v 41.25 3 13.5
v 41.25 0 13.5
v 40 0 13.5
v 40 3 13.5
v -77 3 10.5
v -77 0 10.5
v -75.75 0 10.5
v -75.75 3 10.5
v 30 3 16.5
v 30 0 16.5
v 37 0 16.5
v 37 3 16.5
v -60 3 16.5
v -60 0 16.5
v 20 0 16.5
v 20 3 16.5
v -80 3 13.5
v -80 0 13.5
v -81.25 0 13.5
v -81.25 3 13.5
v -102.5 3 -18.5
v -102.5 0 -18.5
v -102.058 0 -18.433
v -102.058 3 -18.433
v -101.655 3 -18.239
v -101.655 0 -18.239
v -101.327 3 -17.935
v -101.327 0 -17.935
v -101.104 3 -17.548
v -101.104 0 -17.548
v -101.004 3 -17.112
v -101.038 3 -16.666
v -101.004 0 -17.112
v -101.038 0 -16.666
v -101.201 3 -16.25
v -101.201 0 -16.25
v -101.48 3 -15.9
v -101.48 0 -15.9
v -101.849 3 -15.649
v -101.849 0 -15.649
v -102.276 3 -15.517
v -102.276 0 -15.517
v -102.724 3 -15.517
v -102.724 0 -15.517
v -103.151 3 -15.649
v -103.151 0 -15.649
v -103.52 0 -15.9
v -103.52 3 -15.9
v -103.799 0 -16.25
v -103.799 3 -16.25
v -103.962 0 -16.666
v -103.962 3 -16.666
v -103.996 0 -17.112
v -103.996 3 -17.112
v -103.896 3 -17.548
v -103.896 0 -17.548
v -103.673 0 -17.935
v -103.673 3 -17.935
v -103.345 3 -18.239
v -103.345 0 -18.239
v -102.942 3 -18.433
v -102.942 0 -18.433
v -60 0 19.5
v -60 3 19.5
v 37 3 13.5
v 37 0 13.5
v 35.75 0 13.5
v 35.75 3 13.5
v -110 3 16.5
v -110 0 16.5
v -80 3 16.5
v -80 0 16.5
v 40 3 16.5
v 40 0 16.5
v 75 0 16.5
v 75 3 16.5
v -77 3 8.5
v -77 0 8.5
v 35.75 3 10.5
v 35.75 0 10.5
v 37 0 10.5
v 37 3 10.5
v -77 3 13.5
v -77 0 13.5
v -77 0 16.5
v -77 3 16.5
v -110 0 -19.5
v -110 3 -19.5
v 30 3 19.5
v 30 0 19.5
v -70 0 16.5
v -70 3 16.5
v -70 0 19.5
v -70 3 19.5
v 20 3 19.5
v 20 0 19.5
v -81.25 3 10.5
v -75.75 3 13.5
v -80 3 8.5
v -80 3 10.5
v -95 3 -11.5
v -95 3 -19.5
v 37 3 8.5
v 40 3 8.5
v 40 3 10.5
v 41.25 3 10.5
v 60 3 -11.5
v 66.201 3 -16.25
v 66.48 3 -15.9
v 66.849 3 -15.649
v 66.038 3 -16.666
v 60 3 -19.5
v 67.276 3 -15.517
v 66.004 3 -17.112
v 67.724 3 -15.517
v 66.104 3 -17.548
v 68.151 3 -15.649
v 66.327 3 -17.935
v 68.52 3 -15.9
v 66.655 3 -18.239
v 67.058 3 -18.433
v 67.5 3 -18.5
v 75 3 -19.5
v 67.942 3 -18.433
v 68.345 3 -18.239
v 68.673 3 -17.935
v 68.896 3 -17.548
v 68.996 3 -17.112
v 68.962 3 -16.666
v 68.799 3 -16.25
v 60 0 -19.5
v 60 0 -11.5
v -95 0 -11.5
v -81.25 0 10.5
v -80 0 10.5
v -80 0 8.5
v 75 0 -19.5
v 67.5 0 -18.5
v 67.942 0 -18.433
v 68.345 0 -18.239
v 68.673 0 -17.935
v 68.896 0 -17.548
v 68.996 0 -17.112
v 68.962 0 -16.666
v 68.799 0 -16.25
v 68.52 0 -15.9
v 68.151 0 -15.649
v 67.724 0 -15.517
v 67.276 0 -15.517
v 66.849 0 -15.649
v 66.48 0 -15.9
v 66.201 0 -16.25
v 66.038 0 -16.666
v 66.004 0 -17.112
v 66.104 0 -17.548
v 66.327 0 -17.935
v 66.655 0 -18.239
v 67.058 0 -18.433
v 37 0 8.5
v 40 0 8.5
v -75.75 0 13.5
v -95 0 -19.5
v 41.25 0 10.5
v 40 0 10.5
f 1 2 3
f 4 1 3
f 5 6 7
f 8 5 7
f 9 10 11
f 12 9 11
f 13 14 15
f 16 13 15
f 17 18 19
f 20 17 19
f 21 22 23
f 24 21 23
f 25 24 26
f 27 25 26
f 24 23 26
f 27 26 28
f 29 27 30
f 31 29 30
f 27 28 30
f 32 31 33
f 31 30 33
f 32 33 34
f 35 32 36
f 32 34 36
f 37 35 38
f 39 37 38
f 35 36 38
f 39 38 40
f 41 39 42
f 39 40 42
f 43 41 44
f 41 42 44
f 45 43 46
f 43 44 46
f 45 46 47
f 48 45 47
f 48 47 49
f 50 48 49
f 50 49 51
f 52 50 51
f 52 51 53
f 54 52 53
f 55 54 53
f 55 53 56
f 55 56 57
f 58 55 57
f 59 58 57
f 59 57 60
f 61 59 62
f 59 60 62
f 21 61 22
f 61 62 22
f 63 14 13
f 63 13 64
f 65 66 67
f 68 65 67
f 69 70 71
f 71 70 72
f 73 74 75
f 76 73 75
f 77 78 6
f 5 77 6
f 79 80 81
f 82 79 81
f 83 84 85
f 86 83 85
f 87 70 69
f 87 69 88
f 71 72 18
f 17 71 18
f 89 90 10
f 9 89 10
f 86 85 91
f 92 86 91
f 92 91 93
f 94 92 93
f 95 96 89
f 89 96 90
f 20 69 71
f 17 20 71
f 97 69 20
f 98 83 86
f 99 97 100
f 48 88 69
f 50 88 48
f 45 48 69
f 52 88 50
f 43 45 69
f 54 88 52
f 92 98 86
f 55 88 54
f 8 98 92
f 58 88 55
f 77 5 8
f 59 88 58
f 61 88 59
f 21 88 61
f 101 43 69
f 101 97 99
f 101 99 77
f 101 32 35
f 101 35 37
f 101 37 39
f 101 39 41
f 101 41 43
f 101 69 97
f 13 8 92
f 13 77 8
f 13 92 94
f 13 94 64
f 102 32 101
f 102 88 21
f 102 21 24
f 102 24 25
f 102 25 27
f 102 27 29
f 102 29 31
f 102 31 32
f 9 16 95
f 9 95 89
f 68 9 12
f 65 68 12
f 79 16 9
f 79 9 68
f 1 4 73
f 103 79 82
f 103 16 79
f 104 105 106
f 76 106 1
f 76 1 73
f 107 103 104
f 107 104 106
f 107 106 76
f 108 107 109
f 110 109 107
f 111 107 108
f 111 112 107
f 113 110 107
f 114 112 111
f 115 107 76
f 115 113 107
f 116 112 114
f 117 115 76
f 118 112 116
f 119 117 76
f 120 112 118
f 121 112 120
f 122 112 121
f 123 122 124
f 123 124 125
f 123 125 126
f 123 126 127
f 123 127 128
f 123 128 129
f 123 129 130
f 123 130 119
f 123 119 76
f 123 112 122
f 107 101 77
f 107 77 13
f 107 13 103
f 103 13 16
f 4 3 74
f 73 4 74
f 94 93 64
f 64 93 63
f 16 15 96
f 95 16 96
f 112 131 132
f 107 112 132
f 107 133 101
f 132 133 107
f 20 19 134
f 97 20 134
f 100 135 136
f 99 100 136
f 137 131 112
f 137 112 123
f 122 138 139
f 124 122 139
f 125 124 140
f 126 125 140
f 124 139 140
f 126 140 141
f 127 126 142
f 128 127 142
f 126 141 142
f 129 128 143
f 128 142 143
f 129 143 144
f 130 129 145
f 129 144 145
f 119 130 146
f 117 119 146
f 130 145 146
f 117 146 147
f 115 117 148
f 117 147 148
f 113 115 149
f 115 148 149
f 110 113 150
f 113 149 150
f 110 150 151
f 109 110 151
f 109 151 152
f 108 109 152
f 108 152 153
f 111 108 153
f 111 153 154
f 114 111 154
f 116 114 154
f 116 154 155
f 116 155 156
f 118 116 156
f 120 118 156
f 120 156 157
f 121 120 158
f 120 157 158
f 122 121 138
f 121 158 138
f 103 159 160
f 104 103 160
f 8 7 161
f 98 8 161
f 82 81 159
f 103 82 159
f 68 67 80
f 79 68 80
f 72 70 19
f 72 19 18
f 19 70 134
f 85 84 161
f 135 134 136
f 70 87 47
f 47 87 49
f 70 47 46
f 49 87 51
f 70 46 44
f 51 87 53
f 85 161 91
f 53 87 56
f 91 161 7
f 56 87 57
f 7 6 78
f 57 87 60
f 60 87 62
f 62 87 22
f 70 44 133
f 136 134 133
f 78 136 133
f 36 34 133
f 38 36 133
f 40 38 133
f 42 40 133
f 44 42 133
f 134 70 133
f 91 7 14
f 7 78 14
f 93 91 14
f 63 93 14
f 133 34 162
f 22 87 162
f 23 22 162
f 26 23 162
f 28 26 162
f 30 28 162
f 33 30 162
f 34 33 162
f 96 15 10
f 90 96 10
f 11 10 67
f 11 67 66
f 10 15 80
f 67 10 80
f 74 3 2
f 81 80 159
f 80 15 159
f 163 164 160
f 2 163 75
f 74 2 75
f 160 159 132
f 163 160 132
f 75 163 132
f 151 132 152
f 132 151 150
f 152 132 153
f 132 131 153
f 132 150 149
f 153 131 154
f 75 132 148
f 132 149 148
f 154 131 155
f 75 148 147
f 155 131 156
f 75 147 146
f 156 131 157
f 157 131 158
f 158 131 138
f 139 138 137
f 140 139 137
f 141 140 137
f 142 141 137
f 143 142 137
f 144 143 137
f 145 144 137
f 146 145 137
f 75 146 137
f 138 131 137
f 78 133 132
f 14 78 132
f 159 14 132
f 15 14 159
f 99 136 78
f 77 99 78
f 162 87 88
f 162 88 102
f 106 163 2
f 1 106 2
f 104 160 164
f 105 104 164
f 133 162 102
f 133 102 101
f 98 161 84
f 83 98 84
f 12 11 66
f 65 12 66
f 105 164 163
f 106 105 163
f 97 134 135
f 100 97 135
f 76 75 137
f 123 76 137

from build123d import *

# Parameters (mm, degrees)
SKETCH1_W           = 220
SKETCH1_H           = 39
BOSS_EXTRUDE1_DEPTH = 3
SKETCH2_W           = 155
SKETCH2_H           = 8
SKETCH2_W_2         = 80
SKETCH2_H_2         = 3
SKETCH2_R           = 1.5
CUT_EXTRUDE2_DEPTH  = 3


with BuildPart() as part:
    # Sketch1 → Boss-Extrude1 (new body)
    with BuildSketch(Plane(origin=(0, 0, 0), x_dir=(1, 0, 0), z_dir=(0, 1, 0))):
        Rectangle(SKETCH1_W, SKETCH1_H)
    extrude(amount=BOSS_EXTRUDE1_DEPTH)

    # Sketch2 → Cut-Extrude2 (cut)
    with BuildSketch(Plane.XZ):
        Polygon((-77, 16.5), (-80, 16.5), (-80, 13.5), (-81.25, 13.5), (-81.25, 10.5), (-80, 10.5), (-80, 8.5), (-77, 8.5), (-77, 10.5), (-75.75, 10.5), (-75.75, 13.5), (-77, 13.5), align=None)
        Polygon((-110, 16.5), (-80, 16.5), (-77, 16.5), (-70, 16.5), (-70, 19.5), (-110, 19.5), align=None)
        with Locations((-17.5, -15.5)):
            Rectangle(SKETCH2_W, SKETCH2_H)
        Polygon((110, 19.5), (75, 19.5), (75, 16.5), (75, -13), (75, -19.5), (110, -19.5), align=None)
        Polygon((75, 16.5), (75, 19.5), (30, 19.5), (30, 16.5), (37, 16.5), (40, 16.5), align=None)
        Polygon((40, 13.5), (40, 16.5), (37, 16.5), (37, 13.5), (35.75, 13.5), (35.75, 10.5), (37, 10.5), (37, 8.5), (40, 8.5), (40, 10.5), (41.25, 10.5), (41.25, 13.5), align=None)
        with Locations((-20, 18)):
            Rectangle(SKETCH2_W_2, SKETCH2_H_2)
        with Locations(Location((-102.5, -17, 0), (0, 0, 270))):
            Circle(SKETCH2_R)
        with Locations(Location((67.5, -17, 0), (0, 0, 270))):
            Circle(SKETCH2_R)
    extrude(amount=-CUT_EXTRUDE2_DEPTH, mode=Mode.SUBTRACT)


solid = part.part
